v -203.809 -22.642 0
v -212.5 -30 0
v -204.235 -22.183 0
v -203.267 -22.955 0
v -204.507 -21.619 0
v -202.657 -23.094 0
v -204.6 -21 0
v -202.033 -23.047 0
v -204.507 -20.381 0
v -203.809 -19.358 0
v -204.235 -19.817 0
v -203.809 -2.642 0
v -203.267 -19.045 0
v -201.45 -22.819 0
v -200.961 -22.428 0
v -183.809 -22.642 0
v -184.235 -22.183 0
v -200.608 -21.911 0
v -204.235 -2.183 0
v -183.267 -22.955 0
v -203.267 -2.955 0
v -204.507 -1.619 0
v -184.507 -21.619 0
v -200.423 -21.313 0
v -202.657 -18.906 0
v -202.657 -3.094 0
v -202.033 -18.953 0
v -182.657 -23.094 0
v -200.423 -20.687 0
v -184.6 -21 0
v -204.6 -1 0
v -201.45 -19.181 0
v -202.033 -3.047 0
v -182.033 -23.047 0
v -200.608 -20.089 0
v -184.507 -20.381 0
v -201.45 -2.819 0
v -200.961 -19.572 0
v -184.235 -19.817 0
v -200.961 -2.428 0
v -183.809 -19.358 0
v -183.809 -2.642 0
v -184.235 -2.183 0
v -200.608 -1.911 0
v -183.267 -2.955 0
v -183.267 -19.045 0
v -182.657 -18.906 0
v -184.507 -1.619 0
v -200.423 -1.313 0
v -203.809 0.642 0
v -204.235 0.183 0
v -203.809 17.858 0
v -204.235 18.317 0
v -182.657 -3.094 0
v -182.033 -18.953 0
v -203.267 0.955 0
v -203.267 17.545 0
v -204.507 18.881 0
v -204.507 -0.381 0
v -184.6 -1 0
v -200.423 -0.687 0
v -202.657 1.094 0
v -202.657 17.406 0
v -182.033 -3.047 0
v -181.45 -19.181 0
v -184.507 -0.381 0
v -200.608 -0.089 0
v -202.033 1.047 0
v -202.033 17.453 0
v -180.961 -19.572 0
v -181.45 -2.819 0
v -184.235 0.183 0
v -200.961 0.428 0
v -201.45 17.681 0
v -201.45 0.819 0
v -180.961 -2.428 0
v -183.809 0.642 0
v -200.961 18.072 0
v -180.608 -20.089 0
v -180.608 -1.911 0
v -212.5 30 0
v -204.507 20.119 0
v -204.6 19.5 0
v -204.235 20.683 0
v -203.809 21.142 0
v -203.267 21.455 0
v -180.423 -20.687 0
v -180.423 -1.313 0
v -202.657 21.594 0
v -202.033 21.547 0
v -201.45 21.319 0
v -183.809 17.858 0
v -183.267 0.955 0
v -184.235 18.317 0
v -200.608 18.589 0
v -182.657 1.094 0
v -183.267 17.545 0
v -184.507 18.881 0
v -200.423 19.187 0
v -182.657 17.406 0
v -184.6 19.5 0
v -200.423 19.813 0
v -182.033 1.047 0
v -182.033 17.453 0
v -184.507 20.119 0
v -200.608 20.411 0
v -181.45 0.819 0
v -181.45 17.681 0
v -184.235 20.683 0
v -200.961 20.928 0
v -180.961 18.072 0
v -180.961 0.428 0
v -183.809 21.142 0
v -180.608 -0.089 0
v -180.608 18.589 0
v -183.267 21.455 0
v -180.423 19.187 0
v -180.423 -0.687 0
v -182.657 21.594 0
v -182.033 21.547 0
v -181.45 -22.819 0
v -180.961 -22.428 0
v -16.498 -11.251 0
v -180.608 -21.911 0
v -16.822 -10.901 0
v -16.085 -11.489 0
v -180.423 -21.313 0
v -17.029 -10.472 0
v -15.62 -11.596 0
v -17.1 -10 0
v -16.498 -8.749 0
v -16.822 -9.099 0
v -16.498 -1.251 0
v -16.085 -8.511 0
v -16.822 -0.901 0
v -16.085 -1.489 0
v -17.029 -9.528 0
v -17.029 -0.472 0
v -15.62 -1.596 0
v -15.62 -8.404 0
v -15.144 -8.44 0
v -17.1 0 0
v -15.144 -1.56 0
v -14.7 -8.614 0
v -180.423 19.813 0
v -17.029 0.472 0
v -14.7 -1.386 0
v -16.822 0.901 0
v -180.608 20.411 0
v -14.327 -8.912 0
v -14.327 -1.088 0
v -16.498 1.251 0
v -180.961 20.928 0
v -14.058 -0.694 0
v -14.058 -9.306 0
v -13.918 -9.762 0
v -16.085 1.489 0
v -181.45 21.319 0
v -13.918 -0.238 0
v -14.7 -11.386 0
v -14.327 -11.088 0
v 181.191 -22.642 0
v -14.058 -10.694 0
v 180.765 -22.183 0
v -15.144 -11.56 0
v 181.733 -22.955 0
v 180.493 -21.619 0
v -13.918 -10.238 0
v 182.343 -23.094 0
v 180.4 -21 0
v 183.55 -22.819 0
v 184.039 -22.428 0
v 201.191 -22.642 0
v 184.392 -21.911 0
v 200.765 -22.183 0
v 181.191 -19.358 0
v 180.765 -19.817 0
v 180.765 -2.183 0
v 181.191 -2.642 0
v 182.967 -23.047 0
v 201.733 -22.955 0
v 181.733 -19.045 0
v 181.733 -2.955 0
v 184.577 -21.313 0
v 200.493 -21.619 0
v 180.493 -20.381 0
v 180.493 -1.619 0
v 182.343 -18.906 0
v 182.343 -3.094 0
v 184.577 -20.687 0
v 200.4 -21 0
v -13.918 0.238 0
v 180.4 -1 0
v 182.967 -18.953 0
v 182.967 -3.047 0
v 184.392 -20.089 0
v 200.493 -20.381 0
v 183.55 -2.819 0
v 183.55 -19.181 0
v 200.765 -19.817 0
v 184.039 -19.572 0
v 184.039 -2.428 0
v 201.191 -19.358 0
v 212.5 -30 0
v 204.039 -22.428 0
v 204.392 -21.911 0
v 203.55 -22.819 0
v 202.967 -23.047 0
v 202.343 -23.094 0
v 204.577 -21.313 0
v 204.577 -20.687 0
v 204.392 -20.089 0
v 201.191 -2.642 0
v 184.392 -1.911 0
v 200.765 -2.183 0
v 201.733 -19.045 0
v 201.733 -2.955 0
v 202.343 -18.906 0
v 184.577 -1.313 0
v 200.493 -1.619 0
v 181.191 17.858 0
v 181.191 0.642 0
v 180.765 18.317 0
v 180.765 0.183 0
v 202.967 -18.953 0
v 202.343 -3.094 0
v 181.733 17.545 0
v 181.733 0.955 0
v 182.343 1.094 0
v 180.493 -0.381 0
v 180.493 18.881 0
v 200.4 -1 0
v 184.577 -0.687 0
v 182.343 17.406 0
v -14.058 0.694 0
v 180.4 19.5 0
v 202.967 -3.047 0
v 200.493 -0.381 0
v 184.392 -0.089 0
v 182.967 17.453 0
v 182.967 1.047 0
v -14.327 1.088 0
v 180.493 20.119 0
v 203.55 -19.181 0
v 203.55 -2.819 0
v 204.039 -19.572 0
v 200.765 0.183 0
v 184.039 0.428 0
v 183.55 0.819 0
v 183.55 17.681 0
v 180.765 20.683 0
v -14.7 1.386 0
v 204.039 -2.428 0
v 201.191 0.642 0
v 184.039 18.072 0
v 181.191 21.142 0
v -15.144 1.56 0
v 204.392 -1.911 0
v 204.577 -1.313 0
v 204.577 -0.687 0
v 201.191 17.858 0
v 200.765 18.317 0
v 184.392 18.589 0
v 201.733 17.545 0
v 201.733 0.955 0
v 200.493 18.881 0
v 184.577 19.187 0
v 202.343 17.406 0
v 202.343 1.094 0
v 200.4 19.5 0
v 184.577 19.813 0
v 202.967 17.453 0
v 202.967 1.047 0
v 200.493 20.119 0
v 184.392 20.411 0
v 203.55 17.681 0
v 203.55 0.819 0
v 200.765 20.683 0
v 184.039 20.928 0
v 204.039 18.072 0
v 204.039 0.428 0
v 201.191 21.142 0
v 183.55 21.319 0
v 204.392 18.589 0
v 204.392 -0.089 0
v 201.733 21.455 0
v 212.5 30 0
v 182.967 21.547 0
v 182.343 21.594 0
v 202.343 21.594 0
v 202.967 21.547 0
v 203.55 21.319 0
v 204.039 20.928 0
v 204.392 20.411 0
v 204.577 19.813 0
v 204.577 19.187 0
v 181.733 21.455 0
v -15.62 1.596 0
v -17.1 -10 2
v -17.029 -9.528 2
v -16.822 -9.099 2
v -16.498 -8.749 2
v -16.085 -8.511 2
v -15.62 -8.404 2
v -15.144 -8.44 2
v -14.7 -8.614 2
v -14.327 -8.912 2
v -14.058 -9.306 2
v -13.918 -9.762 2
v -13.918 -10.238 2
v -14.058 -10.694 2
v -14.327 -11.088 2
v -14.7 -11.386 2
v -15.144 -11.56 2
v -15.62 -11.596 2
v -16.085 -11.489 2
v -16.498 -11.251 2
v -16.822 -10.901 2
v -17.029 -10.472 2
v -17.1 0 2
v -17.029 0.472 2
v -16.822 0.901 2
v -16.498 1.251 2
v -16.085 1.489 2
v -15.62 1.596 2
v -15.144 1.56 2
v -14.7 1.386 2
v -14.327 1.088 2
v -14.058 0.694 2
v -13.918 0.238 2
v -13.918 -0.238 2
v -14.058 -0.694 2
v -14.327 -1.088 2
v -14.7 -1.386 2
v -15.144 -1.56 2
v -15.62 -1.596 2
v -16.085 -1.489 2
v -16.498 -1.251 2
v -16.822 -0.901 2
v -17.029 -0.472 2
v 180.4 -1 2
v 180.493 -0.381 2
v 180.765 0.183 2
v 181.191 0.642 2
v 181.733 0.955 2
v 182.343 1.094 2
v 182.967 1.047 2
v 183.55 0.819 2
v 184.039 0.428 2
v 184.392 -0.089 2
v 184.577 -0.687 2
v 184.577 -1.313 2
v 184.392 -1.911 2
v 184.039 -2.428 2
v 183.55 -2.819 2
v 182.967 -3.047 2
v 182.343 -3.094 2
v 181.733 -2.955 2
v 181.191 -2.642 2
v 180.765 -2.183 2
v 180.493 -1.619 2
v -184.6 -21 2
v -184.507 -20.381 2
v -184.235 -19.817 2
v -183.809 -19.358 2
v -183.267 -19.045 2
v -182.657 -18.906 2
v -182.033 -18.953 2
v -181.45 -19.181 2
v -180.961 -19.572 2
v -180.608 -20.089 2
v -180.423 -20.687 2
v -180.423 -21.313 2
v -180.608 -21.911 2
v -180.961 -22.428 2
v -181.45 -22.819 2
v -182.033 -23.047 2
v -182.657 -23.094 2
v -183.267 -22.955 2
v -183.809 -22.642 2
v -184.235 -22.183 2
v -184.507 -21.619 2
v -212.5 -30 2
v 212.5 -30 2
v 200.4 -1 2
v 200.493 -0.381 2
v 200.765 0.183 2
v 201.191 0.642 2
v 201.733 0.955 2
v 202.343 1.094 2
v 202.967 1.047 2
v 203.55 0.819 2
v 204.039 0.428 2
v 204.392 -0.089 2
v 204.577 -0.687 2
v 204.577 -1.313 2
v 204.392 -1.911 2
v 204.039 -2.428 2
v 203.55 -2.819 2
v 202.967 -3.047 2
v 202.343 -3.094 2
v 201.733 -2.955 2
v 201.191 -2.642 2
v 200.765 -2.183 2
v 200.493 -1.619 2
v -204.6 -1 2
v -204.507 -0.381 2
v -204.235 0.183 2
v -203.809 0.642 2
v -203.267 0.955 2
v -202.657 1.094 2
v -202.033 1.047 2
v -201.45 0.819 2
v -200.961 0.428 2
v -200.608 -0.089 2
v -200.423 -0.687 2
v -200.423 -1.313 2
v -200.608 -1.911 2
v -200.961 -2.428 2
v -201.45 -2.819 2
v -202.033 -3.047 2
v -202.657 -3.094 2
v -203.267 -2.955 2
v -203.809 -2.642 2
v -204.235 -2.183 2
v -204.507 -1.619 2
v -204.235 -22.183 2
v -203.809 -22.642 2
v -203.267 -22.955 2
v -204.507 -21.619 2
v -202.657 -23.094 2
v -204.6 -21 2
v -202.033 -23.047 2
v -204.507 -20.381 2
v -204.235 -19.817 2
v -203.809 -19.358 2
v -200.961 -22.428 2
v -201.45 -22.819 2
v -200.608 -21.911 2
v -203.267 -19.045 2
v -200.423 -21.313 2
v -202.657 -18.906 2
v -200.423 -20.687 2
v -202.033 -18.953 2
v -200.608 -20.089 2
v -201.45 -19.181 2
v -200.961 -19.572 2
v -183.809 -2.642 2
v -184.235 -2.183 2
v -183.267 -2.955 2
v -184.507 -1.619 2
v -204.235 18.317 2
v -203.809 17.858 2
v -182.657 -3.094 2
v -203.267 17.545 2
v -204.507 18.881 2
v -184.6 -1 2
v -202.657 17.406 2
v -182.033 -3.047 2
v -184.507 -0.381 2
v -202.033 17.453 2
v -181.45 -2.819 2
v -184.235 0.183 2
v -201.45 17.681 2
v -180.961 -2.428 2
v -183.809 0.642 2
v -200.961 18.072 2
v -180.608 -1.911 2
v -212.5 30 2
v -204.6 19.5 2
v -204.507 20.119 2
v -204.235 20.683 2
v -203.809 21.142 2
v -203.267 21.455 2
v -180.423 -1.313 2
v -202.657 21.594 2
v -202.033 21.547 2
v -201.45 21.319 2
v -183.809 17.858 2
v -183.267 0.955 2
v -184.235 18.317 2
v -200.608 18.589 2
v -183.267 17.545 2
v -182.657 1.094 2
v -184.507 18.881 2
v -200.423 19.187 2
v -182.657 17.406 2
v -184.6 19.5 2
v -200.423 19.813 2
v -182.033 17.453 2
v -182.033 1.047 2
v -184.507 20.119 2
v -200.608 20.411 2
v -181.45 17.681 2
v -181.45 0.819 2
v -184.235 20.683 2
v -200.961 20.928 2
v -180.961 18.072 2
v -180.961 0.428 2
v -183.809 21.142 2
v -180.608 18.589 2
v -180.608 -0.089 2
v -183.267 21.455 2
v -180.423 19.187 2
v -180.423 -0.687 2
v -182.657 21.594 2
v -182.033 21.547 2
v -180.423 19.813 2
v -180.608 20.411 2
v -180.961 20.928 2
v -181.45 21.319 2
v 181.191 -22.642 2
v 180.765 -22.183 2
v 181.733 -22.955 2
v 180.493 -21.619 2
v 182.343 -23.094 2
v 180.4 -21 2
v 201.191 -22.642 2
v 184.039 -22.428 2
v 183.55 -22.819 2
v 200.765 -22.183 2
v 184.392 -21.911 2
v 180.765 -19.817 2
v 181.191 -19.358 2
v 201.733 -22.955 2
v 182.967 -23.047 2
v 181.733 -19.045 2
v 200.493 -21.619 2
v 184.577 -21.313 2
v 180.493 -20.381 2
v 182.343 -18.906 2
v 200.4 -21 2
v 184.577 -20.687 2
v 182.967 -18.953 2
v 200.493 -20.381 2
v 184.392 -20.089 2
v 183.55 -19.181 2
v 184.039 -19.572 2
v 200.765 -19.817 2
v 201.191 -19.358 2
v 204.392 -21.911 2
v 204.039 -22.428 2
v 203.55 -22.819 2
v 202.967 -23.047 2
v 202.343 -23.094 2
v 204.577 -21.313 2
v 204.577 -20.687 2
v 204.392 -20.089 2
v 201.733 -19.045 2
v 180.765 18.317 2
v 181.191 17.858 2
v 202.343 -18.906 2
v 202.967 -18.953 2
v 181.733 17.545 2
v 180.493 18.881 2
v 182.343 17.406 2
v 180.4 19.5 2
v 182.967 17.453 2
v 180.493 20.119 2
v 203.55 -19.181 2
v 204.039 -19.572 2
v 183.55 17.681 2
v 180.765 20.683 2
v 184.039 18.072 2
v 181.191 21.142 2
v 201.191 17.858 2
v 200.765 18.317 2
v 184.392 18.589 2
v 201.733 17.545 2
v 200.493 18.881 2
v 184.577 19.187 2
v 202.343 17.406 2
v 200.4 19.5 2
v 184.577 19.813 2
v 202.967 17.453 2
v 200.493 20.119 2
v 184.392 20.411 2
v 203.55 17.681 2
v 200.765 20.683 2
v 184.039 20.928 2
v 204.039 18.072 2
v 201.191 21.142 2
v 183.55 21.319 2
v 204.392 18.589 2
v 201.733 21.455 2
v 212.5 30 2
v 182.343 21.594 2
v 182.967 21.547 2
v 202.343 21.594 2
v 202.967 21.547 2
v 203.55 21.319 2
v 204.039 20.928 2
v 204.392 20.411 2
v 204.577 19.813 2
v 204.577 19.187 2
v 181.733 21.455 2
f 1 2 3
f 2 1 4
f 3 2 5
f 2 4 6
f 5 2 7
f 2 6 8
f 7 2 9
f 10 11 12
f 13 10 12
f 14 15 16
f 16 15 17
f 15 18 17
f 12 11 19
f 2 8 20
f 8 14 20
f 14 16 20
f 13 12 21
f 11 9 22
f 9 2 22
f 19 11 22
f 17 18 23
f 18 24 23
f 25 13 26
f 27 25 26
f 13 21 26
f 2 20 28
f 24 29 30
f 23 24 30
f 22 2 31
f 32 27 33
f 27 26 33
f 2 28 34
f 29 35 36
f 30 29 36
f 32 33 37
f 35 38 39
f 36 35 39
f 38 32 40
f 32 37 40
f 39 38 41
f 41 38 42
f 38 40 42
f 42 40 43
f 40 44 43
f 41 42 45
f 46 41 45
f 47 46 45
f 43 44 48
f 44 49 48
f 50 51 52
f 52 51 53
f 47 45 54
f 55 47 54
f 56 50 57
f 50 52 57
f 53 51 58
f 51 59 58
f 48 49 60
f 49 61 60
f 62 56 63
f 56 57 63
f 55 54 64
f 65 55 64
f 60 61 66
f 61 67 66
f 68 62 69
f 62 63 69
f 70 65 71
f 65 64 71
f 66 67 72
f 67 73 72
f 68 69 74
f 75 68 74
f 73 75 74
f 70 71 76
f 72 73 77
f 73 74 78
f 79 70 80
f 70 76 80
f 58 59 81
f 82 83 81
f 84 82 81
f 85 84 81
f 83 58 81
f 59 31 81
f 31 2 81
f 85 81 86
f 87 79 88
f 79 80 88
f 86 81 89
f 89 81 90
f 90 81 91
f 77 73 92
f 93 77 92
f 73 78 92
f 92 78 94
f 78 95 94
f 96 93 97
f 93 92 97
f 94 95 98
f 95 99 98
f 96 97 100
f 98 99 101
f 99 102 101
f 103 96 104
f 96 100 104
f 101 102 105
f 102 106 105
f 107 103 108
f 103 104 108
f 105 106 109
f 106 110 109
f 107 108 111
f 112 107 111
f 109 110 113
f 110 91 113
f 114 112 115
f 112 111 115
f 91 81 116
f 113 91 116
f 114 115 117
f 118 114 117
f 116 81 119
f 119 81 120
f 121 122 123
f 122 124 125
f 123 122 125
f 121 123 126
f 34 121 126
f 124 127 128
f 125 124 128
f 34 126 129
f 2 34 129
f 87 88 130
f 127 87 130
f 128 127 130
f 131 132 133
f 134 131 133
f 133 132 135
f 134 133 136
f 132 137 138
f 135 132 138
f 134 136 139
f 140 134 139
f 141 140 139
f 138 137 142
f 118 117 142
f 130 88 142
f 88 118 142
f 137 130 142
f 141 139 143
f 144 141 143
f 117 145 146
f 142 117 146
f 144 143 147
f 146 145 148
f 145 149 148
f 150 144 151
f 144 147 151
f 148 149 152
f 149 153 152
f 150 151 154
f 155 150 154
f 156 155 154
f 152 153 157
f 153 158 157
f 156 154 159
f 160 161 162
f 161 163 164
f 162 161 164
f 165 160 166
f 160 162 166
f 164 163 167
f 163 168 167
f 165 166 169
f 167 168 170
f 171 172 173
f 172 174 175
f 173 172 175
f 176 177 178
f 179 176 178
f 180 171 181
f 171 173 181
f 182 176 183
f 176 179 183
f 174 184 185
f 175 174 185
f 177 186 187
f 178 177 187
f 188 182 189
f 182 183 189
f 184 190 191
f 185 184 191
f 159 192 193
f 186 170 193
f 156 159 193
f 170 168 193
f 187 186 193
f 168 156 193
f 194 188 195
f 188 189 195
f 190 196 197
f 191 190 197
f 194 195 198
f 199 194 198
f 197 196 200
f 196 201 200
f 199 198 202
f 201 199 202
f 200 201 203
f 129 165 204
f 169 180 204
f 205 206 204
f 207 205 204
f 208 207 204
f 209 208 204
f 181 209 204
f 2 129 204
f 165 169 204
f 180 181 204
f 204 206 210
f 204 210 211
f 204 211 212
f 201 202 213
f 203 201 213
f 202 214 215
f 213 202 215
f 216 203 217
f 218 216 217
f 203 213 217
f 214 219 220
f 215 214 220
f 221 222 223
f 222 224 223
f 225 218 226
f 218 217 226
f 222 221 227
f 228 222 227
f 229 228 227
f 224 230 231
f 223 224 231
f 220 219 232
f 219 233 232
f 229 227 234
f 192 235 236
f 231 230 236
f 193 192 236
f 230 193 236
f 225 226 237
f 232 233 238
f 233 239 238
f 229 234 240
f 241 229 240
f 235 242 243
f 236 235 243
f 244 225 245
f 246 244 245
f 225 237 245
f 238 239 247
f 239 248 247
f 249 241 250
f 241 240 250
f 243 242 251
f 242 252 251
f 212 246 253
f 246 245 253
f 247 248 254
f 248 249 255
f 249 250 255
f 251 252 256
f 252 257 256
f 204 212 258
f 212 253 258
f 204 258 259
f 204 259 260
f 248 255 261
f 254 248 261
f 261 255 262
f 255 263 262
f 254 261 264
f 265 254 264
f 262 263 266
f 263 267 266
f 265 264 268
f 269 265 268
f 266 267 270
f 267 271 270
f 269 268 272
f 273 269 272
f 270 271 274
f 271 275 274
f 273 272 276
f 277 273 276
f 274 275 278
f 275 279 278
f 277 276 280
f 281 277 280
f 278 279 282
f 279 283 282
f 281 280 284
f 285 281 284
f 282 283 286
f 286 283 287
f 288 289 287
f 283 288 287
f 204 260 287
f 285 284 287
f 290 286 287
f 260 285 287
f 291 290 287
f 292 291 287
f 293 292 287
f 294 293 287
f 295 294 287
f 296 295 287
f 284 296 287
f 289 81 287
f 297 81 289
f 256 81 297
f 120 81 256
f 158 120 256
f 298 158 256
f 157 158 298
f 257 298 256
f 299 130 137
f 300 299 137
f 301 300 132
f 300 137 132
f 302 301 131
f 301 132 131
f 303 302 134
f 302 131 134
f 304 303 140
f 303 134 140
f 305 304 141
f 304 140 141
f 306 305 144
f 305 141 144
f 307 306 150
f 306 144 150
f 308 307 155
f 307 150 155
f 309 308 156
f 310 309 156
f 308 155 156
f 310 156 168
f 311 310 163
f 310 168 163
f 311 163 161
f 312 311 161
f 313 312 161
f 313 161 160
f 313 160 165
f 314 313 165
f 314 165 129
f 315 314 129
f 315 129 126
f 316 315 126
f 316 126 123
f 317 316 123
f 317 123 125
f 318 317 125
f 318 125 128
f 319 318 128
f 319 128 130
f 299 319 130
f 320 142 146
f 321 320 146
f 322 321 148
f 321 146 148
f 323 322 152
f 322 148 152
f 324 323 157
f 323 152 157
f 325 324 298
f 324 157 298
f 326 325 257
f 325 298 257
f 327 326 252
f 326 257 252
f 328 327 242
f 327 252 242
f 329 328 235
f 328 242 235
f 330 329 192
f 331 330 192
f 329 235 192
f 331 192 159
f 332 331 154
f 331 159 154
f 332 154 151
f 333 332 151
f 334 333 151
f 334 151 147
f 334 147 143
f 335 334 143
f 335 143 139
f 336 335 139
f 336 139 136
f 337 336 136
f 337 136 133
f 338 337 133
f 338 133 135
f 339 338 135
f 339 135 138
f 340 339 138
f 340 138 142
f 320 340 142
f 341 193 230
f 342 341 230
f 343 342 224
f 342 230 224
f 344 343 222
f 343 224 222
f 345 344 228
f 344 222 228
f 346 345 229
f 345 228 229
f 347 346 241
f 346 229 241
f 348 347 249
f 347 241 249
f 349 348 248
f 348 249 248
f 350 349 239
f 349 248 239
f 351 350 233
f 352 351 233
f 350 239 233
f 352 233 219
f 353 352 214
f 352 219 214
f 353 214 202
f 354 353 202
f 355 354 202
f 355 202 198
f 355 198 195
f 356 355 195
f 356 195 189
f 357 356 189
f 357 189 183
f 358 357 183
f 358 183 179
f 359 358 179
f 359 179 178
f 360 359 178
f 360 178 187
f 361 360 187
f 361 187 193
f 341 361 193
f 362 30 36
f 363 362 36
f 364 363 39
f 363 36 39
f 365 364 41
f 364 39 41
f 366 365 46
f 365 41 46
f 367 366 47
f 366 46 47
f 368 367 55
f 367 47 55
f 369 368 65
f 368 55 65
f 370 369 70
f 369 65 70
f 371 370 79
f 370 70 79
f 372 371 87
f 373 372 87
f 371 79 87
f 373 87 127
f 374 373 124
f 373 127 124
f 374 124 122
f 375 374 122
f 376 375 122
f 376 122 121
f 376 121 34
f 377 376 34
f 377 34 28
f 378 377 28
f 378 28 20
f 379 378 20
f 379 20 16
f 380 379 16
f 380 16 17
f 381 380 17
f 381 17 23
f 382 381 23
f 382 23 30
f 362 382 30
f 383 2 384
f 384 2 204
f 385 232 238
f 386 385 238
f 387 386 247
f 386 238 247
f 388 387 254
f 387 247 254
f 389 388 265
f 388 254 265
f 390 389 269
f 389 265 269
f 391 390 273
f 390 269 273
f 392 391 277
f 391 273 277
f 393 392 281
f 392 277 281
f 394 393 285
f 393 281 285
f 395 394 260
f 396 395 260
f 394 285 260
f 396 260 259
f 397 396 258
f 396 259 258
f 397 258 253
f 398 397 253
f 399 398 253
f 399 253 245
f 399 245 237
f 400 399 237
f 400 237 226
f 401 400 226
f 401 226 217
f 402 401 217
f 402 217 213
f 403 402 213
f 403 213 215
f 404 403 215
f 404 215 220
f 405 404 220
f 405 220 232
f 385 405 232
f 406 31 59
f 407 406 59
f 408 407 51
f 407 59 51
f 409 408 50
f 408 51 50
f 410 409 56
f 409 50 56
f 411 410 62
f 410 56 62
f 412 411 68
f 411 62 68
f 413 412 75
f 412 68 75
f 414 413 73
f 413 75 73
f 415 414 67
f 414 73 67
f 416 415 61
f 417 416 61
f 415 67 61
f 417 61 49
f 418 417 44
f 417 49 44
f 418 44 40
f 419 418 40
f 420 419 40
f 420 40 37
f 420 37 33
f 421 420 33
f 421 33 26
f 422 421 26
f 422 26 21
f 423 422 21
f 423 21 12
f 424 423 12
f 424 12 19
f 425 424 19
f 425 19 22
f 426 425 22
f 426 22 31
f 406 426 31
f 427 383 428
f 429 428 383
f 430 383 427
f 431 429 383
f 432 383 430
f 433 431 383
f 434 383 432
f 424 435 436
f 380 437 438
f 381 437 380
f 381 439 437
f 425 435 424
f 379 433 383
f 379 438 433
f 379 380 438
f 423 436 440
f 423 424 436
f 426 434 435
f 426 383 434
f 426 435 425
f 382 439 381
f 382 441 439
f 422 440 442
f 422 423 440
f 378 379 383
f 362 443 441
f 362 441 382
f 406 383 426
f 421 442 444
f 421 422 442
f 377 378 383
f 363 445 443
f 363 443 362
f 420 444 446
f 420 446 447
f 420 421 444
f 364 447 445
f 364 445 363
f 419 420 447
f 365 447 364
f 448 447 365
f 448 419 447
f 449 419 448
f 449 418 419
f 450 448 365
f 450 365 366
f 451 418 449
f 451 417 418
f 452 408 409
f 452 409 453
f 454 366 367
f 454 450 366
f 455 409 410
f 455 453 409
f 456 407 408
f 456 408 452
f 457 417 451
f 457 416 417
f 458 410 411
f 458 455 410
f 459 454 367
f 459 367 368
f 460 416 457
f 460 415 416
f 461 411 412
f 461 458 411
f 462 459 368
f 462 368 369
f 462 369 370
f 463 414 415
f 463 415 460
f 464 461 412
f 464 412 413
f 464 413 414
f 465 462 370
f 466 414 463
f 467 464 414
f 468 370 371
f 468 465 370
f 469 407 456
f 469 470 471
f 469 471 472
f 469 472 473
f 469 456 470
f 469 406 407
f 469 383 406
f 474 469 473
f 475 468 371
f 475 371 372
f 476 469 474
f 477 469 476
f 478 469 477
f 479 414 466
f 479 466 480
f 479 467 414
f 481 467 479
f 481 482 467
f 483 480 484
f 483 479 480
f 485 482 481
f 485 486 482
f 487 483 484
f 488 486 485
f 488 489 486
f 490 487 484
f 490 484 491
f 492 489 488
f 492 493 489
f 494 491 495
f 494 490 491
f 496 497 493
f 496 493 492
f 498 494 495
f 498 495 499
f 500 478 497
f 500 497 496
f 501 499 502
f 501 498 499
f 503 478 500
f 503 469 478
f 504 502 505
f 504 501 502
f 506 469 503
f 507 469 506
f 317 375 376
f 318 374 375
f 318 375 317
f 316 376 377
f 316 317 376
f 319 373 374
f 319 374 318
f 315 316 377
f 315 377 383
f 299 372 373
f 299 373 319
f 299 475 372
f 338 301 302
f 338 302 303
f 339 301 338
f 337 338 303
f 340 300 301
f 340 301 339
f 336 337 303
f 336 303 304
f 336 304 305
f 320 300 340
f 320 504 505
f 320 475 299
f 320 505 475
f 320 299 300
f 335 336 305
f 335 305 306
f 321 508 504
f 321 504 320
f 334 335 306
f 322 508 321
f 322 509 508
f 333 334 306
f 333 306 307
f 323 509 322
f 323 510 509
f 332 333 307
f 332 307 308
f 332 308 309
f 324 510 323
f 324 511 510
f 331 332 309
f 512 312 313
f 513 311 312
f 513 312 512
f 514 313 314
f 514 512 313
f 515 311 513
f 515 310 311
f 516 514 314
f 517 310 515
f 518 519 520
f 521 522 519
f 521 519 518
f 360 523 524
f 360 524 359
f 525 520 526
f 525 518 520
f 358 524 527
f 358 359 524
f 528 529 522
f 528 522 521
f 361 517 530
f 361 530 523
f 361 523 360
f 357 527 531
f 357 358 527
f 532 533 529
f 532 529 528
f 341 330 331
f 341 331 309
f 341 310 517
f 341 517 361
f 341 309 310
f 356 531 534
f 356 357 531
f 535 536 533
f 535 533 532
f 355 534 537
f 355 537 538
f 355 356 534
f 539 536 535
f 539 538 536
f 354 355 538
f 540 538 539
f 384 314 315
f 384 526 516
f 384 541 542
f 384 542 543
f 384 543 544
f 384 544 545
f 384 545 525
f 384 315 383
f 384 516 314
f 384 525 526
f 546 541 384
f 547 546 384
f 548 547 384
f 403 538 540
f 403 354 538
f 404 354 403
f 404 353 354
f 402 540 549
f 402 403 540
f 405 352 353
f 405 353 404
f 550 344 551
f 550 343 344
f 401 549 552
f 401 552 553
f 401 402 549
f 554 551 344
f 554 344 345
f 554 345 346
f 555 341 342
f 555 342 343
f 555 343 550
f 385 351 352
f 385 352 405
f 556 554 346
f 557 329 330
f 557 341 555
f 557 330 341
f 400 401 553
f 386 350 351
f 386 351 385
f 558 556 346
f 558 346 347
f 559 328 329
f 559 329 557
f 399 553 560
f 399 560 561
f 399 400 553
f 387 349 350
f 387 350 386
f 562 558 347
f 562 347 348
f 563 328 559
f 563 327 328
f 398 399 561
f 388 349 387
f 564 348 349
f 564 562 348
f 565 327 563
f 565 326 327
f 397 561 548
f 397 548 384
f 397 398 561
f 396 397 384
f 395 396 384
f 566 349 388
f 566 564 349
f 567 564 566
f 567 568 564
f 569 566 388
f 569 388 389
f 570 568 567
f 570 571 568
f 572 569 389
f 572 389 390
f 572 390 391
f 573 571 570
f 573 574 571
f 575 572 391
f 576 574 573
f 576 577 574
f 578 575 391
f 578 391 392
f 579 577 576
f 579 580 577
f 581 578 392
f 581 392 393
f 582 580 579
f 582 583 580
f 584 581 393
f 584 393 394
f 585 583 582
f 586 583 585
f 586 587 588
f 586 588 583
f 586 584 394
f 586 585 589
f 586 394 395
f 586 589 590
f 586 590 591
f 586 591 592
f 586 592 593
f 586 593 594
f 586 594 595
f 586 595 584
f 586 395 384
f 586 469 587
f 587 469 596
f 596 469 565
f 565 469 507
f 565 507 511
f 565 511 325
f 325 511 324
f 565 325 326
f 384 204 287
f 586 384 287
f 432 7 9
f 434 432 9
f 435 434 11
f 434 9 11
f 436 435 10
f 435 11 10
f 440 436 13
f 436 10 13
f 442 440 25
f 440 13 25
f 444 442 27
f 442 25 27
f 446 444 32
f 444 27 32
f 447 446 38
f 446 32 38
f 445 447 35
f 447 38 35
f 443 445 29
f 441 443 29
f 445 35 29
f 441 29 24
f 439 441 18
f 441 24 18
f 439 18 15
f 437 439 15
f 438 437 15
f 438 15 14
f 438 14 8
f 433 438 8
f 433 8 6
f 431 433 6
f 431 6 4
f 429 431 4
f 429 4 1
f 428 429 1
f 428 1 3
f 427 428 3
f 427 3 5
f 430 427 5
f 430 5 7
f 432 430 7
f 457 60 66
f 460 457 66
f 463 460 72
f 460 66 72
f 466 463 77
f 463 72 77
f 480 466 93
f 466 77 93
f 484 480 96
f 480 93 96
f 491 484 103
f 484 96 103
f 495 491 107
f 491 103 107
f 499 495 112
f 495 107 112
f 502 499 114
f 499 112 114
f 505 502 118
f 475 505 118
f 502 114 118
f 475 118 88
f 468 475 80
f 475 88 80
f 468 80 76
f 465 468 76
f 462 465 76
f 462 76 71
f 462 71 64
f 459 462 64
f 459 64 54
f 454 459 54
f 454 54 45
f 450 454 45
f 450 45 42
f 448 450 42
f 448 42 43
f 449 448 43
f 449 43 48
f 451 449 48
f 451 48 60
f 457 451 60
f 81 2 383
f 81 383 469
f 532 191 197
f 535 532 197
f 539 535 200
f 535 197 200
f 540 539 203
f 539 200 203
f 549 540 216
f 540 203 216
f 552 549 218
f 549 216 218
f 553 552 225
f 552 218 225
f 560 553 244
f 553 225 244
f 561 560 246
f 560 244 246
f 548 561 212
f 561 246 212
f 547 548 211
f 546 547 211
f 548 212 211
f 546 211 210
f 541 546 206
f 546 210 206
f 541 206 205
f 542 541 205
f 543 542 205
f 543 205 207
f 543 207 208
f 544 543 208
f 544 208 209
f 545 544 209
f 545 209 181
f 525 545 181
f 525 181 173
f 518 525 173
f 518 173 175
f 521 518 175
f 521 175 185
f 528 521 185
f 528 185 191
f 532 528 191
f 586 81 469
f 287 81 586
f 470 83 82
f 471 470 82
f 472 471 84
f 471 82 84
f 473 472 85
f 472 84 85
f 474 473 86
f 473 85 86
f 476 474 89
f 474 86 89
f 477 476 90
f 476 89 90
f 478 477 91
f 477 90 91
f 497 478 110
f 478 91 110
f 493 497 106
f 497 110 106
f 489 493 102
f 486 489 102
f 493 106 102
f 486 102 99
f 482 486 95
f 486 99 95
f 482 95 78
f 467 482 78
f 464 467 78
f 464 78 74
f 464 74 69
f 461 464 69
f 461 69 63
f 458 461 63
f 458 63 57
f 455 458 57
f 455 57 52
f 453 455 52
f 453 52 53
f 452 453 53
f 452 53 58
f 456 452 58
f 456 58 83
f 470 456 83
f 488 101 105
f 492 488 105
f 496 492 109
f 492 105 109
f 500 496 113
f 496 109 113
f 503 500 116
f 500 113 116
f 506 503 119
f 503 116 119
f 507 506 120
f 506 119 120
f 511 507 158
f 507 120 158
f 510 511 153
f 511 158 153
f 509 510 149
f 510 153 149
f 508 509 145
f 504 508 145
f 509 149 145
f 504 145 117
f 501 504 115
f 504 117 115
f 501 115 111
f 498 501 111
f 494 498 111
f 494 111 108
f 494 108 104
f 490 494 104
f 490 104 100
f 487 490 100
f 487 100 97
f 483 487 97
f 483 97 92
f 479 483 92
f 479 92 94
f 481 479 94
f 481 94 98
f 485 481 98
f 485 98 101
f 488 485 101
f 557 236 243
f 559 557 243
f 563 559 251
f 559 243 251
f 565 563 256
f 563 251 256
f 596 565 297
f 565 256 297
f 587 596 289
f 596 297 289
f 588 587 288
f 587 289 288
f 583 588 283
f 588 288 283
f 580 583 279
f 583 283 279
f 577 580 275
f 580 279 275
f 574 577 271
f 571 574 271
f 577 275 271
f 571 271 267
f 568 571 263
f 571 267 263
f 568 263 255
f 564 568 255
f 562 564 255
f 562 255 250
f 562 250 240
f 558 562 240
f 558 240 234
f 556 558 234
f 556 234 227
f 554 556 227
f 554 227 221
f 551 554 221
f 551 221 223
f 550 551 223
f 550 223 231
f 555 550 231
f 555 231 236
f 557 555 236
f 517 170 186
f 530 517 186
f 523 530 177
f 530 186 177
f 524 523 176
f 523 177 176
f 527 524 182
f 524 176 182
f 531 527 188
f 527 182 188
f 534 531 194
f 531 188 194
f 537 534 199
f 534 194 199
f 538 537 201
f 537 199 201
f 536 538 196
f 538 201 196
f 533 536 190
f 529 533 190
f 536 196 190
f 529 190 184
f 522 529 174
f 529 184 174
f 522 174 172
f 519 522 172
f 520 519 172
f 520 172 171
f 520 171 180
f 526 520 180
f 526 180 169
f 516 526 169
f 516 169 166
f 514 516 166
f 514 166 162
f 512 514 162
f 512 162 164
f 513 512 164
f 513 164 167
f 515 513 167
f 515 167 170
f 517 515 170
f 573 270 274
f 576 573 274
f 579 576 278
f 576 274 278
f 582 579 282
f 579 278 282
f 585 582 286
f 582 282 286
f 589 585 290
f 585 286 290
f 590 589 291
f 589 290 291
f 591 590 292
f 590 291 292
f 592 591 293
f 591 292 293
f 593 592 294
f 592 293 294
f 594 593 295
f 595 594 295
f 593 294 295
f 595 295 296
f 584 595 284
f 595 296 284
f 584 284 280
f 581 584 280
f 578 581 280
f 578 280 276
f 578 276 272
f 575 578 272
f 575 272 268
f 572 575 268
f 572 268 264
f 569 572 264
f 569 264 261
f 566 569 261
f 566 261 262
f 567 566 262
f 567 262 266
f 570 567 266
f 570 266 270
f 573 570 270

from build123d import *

# Parameters (mm, degrees)
SKETCH_1_W          = 425
SKETCH_1_H          = 60
EXTRUDE_1_DEPTH     = 2
SKETCH_2_R          = 2.1
SKETCH_2_R_2        = 1.6
CUT_EXTRUDE_1_DEPTH = 215.61651847


with BuildPart() as part:
    # 草图1 → 凸台-拉伸1 (new body)
    with BuildSketch(Plane.XY):
        Rectangle(SKETCH_1_W, SKETCH_1_H)
    extrude(amount=EXTRUDE_1_DEPTH)

    # 草图2 → 切除-拉伸1 (cut, through all)
    with BuildSketch(Plane(origin=(0, 0, 0), x_dir=(-1, 0, 0), z_dir=(0, 0, -1))):
        with Locations((202.5, -21)):
            Circle(SKETCH_2_R)
        with Locations((182.5, -21)):
            Circle(SKETCH_2_R)
        with Locations((202.5, 19.5)):
            Circle(SKETCH_2_R)
        with Locations((202.5, -1)):
            Circle(SKETCH_2_R)
        with Locations((182.5, -1)):
            Circle(SKETCH_2_R)
        with Locations((182.5, 19.5)):
            Circle(SKETCH_2_R)
        with Locations((-182.5, -21)):
            Circle(SKETCH_2_R)
        with Locations((-202.5, -21)):
            Circle(SKETCH_2_R)
        with Locations((-182.5, -1)):
            Circle(SKETCH_2_R)
        with Locations((-202.5, -1)):
            Circle(SKETCH_2_R)
        with Locations((-202.5, 19.5)):
            Circle(SKETCH_2_R)
        with Locations((-182.5, 19.5)):
            Circle(SKETCH_2_R)
        with Locations((15.5, -10)):
            Circle(SKETCH_2_R_2)
        with Locations((15.5, 0)):
            Circle(SKETCH_2_R_2)
    extrude(amount=-CUT_EXTRUDE_1_DEPTH, mode=Mode.SUBTRACT)


solid = part.part
